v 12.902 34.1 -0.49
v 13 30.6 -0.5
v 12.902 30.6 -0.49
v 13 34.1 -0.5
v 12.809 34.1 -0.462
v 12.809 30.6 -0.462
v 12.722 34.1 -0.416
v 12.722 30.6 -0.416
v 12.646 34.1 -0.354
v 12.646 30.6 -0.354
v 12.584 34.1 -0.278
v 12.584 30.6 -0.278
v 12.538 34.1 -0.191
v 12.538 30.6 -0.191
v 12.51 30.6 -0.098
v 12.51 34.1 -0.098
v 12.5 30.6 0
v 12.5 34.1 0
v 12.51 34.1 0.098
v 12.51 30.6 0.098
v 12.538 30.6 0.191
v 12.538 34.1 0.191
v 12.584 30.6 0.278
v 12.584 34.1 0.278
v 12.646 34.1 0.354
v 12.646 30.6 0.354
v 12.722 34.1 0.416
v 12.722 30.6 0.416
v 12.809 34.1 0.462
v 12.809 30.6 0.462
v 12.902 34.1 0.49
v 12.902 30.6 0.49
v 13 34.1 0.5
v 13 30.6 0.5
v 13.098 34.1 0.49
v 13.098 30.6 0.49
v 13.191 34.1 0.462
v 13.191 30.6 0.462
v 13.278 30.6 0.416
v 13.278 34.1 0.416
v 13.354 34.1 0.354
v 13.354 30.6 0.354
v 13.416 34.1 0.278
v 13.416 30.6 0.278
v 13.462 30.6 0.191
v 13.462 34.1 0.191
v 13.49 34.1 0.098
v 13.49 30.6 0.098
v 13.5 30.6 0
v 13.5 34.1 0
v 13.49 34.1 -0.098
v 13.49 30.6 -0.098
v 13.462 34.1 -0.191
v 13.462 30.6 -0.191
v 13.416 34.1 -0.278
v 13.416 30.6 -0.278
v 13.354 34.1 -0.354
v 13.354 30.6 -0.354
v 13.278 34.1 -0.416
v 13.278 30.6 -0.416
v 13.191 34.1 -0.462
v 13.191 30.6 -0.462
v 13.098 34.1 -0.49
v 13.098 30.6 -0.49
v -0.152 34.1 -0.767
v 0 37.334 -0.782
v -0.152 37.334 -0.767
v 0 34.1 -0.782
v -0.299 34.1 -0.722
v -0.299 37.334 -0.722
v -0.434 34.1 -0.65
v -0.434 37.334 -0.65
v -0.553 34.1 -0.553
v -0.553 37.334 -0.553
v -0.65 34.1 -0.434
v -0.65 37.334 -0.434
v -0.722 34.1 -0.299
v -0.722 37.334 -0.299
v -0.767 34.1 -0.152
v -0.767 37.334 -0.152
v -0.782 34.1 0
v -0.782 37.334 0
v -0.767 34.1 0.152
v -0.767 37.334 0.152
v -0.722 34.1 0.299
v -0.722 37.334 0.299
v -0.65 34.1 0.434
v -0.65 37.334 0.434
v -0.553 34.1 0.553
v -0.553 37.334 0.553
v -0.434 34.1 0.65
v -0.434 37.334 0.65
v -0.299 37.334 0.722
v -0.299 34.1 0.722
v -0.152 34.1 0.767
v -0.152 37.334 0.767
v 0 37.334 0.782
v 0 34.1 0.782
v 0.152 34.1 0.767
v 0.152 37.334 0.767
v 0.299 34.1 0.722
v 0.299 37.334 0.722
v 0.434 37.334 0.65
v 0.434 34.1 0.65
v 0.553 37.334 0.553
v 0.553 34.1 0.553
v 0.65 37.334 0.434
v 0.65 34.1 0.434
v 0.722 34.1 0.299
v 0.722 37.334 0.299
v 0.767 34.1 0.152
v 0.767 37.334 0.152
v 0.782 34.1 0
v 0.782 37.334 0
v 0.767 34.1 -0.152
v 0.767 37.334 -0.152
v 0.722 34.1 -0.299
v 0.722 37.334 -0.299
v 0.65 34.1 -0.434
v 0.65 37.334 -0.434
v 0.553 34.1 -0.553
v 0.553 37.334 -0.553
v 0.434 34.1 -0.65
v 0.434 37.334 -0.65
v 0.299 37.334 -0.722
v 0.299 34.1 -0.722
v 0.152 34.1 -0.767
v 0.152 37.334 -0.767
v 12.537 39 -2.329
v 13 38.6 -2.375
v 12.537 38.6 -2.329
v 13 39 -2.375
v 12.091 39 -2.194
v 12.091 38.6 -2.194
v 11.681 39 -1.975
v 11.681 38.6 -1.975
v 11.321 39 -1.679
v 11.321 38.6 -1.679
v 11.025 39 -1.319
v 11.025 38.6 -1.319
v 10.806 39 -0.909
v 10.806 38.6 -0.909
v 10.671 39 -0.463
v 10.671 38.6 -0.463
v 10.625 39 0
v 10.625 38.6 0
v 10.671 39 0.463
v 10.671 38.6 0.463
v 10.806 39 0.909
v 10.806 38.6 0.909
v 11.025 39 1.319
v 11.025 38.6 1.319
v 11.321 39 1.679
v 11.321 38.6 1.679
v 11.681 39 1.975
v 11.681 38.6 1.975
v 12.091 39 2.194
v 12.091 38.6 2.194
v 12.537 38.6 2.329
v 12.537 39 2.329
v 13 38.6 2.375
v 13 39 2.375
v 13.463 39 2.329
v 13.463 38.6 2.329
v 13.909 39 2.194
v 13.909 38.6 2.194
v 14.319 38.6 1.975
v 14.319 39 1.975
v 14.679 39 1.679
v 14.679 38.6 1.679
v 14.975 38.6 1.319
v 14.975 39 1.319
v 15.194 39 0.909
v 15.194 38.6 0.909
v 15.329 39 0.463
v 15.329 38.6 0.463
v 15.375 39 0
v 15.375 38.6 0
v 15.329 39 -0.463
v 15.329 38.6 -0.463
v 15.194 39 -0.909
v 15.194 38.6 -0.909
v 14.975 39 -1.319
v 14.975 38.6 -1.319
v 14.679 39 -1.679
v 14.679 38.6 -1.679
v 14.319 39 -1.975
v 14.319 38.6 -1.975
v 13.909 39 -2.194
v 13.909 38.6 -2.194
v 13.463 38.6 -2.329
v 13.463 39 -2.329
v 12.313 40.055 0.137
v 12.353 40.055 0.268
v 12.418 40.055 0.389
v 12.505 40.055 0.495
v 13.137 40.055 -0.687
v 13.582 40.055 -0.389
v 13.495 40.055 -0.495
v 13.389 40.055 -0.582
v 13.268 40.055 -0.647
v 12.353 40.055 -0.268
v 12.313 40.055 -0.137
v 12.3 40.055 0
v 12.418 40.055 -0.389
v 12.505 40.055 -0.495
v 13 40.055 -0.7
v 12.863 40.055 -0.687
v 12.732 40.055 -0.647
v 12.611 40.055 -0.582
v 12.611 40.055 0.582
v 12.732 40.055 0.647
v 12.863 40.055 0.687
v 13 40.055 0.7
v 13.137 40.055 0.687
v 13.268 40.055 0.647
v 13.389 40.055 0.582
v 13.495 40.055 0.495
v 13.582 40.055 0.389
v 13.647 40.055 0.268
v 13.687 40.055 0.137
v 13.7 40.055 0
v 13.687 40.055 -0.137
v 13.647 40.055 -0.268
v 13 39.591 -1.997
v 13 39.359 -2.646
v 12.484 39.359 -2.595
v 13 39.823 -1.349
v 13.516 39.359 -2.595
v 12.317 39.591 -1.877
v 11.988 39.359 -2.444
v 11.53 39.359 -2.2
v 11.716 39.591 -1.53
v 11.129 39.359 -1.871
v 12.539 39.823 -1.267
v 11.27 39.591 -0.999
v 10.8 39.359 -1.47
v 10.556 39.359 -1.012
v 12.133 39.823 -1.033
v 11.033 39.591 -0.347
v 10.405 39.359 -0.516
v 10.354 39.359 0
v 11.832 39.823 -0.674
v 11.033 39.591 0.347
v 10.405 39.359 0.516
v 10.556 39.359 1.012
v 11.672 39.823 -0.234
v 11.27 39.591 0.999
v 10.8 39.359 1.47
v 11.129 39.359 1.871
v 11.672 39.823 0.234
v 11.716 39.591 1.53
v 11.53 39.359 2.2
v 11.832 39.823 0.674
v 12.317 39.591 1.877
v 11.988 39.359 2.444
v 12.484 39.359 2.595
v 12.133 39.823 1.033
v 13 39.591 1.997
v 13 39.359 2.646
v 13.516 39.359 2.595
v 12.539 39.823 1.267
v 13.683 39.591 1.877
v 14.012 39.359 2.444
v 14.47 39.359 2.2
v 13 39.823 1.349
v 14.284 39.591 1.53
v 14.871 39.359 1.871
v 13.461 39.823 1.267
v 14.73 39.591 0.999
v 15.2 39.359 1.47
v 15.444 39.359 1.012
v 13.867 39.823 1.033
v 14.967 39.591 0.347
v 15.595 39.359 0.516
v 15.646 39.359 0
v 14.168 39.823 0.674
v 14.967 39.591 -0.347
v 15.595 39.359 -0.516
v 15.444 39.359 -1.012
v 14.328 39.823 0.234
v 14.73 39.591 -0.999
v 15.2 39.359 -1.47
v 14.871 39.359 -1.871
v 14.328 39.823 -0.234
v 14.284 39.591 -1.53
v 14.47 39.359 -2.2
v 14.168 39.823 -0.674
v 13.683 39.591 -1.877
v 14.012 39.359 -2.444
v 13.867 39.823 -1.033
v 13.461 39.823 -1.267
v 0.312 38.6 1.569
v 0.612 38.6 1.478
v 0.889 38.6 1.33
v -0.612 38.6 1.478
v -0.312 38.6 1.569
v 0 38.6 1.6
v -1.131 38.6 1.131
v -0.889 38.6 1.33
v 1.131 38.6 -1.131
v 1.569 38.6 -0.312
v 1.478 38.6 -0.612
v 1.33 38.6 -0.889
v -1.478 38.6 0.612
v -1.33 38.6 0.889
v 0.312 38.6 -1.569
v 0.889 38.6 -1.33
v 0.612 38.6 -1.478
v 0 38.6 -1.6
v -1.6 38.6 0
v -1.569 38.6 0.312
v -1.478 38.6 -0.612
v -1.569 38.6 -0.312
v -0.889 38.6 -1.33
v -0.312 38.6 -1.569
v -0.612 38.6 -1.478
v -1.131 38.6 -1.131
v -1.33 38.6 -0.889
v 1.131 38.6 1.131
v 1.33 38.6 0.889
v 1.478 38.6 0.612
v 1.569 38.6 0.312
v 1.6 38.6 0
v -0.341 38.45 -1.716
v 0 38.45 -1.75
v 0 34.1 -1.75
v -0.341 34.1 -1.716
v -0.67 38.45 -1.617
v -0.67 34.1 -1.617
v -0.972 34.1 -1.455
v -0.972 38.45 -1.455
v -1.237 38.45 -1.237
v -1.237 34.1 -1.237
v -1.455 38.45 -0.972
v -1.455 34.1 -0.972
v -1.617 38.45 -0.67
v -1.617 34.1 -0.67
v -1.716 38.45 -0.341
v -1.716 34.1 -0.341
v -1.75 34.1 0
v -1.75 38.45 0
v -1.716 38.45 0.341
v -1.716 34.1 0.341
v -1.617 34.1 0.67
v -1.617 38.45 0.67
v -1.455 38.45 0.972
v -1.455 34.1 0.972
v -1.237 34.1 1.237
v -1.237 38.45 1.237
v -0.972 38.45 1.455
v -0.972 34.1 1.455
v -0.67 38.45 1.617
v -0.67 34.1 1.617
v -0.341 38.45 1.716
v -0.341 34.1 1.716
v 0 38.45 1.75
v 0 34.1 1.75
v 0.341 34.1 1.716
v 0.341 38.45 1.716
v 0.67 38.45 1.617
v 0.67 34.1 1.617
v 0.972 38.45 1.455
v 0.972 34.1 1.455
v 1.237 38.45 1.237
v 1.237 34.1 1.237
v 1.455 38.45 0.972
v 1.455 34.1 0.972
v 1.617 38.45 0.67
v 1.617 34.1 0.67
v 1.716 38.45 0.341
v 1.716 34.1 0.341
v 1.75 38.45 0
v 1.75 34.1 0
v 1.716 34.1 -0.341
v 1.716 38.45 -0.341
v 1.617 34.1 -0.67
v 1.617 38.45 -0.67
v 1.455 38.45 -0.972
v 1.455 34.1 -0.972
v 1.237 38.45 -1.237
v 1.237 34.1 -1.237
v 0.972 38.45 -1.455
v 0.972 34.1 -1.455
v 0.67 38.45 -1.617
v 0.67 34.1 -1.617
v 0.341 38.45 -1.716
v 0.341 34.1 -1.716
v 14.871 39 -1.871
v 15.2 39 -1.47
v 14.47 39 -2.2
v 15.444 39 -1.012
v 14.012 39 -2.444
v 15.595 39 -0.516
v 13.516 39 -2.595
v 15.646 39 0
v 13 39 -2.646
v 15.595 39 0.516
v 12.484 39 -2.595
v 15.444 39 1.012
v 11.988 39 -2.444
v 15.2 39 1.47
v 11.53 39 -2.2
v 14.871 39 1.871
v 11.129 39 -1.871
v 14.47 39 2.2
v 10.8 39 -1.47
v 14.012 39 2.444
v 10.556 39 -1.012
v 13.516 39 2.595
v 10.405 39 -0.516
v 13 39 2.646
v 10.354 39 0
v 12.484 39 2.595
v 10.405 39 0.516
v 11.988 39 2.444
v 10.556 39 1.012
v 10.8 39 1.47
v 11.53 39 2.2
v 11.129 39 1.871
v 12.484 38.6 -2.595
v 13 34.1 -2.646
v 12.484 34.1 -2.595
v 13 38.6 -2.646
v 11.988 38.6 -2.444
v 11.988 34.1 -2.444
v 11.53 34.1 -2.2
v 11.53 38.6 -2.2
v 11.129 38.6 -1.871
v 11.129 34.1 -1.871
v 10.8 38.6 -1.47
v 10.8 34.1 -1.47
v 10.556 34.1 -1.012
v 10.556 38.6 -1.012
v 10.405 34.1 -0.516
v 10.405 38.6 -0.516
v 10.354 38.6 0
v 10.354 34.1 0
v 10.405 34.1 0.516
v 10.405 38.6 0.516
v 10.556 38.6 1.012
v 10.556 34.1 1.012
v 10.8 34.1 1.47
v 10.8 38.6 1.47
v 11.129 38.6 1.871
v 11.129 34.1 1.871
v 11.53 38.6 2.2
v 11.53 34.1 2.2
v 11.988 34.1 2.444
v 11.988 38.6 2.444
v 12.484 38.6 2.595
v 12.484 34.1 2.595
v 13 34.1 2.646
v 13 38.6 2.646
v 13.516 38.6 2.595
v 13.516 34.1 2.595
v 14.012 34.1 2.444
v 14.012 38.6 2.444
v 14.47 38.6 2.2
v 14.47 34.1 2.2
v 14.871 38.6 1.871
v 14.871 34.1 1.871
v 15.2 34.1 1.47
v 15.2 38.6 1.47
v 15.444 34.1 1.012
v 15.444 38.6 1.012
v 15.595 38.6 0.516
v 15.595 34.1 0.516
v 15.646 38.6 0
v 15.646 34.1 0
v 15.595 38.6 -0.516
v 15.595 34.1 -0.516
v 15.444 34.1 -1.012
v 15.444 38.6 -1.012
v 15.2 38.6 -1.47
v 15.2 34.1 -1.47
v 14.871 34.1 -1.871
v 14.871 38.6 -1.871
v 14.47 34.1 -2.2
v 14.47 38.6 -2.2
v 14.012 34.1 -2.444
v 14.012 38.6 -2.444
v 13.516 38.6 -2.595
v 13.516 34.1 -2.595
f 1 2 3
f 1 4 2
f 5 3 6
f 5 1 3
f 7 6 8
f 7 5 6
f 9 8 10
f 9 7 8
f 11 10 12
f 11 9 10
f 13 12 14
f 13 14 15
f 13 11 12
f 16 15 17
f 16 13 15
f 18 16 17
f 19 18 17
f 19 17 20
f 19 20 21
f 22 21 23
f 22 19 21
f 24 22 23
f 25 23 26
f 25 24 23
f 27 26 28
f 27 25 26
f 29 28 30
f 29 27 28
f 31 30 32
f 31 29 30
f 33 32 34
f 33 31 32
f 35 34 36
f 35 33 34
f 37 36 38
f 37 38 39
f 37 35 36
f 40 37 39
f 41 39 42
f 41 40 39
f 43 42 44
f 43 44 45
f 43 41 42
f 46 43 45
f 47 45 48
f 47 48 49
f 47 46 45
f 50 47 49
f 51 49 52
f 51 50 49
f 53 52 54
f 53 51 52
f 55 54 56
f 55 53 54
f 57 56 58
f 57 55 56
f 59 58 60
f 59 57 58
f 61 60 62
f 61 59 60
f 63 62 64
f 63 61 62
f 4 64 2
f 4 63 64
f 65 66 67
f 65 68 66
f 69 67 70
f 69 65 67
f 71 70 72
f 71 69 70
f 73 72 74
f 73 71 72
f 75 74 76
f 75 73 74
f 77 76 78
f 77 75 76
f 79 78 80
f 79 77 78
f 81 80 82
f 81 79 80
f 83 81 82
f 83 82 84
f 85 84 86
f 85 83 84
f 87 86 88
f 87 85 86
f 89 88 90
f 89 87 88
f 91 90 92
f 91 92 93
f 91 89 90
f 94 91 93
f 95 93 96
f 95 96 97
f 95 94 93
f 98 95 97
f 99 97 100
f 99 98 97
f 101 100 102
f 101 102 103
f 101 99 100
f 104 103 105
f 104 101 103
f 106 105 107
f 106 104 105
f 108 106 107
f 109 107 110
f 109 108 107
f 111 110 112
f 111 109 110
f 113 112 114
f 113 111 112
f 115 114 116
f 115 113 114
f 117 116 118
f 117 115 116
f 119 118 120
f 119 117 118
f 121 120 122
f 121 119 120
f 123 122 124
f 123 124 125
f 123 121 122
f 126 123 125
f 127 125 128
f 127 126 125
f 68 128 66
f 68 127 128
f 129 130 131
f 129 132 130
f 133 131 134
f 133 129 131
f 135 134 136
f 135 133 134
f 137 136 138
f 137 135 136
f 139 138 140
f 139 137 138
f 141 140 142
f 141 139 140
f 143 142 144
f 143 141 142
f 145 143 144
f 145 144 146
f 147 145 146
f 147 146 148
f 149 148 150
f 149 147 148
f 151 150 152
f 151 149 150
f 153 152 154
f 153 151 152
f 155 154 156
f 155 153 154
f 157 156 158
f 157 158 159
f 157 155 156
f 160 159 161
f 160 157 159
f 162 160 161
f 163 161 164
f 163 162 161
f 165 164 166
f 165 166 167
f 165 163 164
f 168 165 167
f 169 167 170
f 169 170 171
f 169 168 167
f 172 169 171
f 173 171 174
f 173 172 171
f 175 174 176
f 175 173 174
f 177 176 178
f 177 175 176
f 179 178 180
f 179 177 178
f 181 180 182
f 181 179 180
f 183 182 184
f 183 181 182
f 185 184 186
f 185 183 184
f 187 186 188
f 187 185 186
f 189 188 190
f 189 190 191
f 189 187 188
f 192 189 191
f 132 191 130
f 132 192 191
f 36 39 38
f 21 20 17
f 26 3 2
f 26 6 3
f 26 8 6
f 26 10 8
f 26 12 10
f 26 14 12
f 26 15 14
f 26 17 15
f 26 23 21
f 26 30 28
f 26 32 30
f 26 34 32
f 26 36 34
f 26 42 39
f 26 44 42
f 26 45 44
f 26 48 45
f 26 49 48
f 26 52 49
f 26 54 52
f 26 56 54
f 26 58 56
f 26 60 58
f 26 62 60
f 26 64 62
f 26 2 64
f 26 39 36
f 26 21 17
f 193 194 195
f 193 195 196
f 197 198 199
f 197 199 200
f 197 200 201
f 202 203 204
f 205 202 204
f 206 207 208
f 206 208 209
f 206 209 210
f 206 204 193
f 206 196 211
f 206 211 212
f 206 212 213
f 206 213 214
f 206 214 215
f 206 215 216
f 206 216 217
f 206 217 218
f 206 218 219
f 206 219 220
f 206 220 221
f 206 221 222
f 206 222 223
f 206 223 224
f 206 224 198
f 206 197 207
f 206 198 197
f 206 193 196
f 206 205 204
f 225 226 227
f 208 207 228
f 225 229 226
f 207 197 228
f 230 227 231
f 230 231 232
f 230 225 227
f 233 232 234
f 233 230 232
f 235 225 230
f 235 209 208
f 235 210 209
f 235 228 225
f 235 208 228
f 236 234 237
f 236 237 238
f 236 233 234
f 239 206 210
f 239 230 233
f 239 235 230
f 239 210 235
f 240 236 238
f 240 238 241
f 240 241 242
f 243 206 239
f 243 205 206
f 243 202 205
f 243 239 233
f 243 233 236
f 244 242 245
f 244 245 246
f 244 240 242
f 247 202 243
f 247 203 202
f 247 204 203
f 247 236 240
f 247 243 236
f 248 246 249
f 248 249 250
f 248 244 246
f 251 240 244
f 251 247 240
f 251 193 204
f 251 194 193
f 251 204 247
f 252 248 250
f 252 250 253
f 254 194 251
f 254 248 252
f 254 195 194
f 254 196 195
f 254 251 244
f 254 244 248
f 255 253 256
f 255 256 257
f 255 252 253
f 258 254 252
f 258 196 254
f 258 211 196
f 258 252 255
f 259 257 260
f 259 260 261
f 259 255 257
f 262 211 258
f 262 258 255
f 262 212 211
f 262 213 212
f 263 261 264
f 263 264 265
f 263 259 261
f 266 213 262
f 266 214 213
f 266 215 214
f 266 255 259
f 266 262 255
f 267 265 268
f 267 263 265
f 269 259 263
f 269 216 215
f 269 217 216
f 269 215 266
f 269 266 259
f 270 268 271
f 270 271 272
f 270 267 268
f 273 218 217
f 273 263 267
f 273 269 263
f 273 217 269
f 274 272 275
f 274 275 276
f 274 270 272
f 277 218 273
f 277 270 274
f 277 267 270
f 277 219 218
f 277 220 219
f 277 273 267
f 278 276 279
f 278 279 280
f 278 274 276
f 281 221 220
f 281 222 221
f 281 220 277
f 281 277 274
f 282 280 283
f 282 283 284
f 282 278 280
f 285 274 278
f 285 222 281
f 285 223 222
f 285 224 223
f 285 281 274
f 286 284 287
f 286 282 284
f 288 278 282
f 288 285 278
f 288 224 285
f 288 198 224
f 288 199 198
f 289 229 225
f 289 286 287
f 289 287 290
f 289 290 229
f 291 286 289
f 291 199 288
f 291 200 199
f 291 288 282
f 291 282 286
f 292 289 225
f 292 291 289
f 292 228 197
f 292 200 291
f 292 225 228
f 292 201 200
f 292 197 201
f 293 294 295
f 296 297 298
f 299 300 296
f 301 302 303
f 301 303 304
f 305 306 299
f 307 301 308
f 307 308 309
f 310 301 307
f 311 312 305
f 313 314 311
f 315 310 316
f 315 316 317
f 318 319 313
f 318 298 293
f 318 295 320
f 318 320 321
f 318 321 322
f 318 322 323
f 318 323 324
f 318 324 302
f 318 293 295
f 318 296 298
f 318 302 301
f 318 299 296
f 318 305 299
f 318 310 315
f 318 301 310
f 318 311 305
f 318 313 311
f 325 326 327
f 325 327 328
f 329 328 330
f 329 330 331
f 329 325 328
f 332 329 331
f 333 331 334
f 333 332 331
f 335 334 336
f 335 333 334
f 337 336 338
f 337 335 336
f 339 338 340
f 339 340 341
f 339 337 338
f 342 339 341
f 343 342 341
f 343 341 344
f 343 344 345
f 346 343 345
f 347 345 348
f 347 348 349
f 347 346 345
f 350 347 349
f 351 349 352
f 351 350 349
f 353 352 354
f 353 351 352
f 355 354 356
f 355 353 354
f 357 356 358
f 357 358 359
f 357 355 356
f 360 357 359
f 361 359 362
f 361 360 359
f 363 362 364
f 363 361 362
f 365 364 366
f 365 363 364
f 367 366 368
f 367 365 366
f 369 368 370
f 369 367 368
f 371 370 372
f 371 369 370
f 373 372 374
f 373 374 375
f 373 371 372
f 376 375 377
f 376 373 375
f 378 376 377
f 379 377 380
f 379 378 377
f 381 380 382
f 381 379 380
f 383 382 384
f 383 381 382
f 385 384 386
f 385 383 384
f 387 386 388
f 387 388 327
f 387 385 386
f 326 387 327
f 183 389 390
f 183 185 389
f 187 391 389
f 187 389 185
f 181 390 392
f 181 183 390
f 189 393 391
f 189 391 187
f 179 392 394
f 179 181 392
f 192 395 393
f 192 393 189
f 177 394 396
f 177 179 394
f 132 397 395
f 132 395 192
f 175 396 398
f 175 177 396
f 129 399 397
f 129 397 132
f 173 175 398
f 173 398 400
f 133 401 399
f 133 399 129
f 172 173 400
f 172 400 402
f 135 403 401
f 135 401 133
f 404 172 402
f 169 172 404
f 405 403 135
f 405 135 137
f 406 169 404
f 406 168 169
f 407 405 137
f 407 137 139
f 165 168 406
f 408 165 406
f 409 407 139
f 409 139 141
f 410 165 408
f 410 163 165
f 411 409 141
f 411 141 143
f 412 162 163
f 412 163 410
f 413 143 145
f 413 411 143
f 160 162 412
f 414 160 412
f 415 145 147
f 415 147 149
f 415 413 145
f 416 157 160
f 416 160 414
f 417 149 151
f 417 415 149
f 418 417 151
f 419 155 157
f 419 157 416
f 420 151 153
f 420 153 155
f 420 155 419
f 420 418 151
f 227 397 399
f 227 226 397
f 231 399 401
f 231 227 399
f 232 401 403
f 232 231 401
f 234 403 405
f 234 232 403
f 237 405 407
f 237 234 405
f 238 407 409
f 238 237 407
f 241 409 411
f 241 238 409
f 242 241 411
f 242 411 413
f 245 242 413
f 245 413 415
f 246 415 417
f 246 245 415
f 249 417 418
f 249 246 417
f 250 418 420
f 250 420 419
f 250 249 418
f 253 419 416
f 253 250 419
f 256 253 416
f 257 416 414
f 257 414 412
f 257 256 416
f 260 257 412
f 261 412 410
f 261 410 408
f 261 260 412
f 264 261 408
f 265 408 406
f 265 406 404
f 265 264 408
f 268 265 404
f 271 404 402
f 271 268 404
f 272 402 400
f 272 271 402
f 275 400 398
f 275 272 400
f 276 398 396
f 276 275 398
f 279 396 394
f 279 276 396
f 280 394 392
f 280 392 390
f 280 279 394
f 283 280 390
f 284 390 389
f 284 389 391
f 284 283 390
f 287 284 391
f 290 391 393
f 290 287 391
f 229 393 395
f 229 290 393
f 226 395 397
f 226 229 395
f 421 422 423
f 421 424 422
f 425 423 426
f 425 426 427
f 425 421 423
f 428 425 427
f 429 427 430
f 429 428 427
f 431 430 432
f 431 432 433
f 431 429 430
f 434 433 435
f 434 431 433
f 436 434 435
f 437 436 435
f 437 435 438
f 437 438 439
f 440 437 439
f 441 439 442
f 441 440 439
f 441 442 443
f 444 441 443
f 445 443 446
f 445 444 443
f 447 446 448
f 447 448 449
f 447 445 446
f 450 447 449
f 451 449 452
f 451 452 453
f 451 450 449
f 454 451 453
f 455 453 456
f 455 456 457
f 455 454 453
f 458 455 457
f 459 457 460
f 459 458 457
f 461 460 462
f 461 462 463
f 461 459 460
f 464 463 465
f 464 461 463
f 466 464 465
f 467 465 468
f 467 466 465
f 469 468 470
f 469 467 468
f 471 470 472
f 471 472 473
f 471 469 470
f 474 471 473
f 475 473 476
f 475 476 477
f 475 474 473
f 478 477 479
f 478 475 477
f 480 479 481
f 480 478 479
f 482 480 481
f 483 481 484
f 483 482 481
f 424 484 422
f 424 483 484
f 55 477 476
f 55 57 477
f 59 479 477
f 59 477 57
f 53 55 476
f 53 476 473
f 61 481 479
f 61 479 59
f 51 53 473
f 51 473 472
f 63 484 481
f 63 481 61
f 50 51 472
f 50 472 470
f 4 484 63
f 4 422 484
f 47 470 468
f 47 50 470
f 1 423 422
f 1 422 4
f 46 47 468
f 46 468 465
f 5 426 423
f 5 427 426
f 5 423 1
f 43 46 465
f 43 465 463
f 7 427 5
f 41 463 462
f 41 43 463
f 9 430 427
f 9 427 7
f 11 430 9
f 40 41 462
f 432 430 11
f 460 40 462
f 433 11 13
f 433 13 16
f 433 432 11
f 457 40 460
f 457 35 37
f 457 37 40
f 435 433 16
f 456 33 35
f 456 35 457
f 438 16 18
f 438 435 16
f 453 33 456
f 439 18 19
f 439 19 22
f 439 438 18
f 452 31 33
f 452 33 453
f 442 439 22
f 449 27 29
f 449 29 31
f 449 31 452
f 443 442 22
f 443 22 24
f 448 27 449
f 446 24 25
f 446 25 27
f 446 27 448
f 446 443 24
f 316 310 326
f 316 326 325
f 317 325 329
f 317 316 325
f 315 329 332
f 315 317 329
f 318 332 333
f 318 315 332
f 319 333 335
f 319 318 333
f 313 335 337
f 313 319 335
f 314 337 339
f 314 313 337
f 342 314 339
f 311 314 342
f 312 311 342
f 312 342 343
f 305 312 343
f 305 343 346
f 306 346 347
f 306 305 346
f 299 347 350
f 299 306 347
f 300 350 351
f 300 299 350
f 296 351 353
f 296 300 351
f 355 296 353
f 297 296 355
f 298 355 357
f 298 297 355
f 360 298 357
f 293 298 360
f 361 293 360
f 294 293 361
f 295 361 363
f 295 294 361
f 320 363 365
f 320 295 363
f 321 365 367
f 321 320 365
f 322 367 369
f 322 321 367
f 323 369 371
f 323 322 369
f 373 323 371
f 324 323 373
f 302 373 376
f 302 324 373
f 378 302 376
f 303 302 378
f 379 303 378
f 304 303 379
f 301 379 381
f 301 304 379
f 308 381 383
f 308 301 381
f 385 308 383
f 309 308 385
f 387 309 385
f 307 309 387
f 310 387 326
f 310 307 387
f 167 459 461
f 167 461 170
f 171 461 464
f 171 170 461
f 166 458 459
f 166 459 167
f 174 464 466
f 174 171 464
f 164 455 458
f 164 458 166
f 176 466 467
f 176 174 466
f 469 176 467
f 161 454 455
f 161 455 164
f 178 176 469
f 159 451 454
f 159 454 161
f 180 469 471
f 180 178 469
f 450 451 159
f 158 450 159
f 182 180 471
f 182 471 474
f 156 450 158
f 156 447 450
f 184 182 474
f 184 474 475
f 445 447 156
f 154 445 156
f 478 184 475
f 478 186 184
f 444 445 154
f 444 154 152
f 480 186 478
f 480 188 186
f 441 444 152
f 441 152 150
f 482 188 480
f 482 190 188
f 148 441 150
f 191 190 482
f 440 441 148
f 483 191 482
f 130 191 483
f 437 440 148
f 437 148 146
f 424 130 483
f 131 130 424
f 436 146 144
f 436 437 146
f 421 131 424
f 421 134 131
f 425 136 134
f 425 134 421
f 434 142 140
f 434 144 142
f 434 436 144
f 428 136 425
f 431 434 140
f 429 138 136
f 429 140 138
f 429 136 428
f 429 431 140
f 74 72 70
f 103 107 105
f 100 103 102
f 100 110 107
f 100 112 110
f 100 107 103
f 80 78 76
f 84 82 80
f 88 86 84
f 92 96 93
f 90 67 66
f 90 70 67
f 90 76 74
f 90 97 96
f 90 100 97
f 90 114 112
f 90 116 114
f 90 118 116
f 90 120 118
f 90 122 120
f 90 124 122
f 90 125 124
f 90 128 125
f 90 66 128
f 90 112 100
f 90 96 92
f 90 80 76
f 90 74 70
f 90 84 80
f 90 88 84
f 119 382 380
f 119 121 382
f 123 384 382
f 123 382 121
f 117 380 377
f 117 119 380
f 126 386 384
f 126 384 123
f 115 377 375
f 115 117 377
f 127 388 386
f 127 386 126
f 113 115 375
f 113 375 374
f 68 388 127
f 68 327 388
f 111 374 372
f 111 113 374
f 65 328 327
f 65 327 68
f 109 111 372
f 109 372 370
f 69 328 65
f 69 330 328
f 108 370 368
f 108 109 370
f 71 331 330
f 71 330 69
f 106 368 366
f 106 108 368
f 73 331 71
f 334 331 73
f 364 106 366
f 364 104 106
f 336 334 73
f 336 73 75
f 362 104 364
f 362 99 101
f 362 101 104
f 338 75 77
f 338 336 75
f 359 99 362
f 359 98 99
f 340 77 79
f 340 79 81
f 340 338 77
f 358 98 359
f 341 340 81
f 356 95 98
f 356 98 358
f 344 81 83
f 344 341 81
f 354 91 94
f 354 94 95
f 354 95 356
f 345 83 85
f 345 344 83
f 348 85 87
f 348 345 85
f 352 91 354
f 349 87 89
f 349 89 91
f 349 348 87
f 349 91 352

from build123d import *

# Parameters (mm, degrees)
CHAMFER_1_SIZE = 0.15


with BuildPart() as part:
    # Эскиз1 → Повернуть1 (revolve)
    with BuildSketch(Plane.XY, mode=Mode.PRIVATE) as revolve_1_sk:
        Polygon((0, 37.333876566), (-0.78167855, 37.333876566), (-0.78167855, 34.1), (-1.75, 34.1), (-1.75, 38.6), (0, 38.6), align=None)
    revolve(revolve_1_sk.sketch.rotate(Axis((0, 38.6, 0), (0, 1, 0)), 270), axis=Axis((0, 38.6, 0), (0, 1, 0)))

    # Фаска1
    chamfer_1_edges = [part.edges().sort_by_distance(p)[0] for p in [
        (0, 38.6, 1.75),
    ]]
    chamfer(chamfer_1_edges, length=CHAMFER_1_SIZE)


with BuildPart() as body_2:
    # Эскиз3 → Повернуть2 (revolve)
    with BuildSketch(Plane.XY, mode=Mode.PRIVATE) as revolve_2_sk:
        Polygon((12.5, 34.1), (10.354407203, 34.1), (10.354407203, 38.6), (10.625, 38.6), (10.625, 39), (10.354407203, 39), (10.354407203, 39.358691232), (12.3, 40.055094394), (13, 40.055094394), (13, 34.1), (13, 30.6), (12.5, 30.6), align=None)
    revolve(revolve_2_sk.sketch.rotate(Axis((13, 34.1, 0), (0, 1, 0)), 270), axis=Axis((13, 34.1, 0), (0, 1, 0)))


solid = Compound([part.part, body_2.part])
